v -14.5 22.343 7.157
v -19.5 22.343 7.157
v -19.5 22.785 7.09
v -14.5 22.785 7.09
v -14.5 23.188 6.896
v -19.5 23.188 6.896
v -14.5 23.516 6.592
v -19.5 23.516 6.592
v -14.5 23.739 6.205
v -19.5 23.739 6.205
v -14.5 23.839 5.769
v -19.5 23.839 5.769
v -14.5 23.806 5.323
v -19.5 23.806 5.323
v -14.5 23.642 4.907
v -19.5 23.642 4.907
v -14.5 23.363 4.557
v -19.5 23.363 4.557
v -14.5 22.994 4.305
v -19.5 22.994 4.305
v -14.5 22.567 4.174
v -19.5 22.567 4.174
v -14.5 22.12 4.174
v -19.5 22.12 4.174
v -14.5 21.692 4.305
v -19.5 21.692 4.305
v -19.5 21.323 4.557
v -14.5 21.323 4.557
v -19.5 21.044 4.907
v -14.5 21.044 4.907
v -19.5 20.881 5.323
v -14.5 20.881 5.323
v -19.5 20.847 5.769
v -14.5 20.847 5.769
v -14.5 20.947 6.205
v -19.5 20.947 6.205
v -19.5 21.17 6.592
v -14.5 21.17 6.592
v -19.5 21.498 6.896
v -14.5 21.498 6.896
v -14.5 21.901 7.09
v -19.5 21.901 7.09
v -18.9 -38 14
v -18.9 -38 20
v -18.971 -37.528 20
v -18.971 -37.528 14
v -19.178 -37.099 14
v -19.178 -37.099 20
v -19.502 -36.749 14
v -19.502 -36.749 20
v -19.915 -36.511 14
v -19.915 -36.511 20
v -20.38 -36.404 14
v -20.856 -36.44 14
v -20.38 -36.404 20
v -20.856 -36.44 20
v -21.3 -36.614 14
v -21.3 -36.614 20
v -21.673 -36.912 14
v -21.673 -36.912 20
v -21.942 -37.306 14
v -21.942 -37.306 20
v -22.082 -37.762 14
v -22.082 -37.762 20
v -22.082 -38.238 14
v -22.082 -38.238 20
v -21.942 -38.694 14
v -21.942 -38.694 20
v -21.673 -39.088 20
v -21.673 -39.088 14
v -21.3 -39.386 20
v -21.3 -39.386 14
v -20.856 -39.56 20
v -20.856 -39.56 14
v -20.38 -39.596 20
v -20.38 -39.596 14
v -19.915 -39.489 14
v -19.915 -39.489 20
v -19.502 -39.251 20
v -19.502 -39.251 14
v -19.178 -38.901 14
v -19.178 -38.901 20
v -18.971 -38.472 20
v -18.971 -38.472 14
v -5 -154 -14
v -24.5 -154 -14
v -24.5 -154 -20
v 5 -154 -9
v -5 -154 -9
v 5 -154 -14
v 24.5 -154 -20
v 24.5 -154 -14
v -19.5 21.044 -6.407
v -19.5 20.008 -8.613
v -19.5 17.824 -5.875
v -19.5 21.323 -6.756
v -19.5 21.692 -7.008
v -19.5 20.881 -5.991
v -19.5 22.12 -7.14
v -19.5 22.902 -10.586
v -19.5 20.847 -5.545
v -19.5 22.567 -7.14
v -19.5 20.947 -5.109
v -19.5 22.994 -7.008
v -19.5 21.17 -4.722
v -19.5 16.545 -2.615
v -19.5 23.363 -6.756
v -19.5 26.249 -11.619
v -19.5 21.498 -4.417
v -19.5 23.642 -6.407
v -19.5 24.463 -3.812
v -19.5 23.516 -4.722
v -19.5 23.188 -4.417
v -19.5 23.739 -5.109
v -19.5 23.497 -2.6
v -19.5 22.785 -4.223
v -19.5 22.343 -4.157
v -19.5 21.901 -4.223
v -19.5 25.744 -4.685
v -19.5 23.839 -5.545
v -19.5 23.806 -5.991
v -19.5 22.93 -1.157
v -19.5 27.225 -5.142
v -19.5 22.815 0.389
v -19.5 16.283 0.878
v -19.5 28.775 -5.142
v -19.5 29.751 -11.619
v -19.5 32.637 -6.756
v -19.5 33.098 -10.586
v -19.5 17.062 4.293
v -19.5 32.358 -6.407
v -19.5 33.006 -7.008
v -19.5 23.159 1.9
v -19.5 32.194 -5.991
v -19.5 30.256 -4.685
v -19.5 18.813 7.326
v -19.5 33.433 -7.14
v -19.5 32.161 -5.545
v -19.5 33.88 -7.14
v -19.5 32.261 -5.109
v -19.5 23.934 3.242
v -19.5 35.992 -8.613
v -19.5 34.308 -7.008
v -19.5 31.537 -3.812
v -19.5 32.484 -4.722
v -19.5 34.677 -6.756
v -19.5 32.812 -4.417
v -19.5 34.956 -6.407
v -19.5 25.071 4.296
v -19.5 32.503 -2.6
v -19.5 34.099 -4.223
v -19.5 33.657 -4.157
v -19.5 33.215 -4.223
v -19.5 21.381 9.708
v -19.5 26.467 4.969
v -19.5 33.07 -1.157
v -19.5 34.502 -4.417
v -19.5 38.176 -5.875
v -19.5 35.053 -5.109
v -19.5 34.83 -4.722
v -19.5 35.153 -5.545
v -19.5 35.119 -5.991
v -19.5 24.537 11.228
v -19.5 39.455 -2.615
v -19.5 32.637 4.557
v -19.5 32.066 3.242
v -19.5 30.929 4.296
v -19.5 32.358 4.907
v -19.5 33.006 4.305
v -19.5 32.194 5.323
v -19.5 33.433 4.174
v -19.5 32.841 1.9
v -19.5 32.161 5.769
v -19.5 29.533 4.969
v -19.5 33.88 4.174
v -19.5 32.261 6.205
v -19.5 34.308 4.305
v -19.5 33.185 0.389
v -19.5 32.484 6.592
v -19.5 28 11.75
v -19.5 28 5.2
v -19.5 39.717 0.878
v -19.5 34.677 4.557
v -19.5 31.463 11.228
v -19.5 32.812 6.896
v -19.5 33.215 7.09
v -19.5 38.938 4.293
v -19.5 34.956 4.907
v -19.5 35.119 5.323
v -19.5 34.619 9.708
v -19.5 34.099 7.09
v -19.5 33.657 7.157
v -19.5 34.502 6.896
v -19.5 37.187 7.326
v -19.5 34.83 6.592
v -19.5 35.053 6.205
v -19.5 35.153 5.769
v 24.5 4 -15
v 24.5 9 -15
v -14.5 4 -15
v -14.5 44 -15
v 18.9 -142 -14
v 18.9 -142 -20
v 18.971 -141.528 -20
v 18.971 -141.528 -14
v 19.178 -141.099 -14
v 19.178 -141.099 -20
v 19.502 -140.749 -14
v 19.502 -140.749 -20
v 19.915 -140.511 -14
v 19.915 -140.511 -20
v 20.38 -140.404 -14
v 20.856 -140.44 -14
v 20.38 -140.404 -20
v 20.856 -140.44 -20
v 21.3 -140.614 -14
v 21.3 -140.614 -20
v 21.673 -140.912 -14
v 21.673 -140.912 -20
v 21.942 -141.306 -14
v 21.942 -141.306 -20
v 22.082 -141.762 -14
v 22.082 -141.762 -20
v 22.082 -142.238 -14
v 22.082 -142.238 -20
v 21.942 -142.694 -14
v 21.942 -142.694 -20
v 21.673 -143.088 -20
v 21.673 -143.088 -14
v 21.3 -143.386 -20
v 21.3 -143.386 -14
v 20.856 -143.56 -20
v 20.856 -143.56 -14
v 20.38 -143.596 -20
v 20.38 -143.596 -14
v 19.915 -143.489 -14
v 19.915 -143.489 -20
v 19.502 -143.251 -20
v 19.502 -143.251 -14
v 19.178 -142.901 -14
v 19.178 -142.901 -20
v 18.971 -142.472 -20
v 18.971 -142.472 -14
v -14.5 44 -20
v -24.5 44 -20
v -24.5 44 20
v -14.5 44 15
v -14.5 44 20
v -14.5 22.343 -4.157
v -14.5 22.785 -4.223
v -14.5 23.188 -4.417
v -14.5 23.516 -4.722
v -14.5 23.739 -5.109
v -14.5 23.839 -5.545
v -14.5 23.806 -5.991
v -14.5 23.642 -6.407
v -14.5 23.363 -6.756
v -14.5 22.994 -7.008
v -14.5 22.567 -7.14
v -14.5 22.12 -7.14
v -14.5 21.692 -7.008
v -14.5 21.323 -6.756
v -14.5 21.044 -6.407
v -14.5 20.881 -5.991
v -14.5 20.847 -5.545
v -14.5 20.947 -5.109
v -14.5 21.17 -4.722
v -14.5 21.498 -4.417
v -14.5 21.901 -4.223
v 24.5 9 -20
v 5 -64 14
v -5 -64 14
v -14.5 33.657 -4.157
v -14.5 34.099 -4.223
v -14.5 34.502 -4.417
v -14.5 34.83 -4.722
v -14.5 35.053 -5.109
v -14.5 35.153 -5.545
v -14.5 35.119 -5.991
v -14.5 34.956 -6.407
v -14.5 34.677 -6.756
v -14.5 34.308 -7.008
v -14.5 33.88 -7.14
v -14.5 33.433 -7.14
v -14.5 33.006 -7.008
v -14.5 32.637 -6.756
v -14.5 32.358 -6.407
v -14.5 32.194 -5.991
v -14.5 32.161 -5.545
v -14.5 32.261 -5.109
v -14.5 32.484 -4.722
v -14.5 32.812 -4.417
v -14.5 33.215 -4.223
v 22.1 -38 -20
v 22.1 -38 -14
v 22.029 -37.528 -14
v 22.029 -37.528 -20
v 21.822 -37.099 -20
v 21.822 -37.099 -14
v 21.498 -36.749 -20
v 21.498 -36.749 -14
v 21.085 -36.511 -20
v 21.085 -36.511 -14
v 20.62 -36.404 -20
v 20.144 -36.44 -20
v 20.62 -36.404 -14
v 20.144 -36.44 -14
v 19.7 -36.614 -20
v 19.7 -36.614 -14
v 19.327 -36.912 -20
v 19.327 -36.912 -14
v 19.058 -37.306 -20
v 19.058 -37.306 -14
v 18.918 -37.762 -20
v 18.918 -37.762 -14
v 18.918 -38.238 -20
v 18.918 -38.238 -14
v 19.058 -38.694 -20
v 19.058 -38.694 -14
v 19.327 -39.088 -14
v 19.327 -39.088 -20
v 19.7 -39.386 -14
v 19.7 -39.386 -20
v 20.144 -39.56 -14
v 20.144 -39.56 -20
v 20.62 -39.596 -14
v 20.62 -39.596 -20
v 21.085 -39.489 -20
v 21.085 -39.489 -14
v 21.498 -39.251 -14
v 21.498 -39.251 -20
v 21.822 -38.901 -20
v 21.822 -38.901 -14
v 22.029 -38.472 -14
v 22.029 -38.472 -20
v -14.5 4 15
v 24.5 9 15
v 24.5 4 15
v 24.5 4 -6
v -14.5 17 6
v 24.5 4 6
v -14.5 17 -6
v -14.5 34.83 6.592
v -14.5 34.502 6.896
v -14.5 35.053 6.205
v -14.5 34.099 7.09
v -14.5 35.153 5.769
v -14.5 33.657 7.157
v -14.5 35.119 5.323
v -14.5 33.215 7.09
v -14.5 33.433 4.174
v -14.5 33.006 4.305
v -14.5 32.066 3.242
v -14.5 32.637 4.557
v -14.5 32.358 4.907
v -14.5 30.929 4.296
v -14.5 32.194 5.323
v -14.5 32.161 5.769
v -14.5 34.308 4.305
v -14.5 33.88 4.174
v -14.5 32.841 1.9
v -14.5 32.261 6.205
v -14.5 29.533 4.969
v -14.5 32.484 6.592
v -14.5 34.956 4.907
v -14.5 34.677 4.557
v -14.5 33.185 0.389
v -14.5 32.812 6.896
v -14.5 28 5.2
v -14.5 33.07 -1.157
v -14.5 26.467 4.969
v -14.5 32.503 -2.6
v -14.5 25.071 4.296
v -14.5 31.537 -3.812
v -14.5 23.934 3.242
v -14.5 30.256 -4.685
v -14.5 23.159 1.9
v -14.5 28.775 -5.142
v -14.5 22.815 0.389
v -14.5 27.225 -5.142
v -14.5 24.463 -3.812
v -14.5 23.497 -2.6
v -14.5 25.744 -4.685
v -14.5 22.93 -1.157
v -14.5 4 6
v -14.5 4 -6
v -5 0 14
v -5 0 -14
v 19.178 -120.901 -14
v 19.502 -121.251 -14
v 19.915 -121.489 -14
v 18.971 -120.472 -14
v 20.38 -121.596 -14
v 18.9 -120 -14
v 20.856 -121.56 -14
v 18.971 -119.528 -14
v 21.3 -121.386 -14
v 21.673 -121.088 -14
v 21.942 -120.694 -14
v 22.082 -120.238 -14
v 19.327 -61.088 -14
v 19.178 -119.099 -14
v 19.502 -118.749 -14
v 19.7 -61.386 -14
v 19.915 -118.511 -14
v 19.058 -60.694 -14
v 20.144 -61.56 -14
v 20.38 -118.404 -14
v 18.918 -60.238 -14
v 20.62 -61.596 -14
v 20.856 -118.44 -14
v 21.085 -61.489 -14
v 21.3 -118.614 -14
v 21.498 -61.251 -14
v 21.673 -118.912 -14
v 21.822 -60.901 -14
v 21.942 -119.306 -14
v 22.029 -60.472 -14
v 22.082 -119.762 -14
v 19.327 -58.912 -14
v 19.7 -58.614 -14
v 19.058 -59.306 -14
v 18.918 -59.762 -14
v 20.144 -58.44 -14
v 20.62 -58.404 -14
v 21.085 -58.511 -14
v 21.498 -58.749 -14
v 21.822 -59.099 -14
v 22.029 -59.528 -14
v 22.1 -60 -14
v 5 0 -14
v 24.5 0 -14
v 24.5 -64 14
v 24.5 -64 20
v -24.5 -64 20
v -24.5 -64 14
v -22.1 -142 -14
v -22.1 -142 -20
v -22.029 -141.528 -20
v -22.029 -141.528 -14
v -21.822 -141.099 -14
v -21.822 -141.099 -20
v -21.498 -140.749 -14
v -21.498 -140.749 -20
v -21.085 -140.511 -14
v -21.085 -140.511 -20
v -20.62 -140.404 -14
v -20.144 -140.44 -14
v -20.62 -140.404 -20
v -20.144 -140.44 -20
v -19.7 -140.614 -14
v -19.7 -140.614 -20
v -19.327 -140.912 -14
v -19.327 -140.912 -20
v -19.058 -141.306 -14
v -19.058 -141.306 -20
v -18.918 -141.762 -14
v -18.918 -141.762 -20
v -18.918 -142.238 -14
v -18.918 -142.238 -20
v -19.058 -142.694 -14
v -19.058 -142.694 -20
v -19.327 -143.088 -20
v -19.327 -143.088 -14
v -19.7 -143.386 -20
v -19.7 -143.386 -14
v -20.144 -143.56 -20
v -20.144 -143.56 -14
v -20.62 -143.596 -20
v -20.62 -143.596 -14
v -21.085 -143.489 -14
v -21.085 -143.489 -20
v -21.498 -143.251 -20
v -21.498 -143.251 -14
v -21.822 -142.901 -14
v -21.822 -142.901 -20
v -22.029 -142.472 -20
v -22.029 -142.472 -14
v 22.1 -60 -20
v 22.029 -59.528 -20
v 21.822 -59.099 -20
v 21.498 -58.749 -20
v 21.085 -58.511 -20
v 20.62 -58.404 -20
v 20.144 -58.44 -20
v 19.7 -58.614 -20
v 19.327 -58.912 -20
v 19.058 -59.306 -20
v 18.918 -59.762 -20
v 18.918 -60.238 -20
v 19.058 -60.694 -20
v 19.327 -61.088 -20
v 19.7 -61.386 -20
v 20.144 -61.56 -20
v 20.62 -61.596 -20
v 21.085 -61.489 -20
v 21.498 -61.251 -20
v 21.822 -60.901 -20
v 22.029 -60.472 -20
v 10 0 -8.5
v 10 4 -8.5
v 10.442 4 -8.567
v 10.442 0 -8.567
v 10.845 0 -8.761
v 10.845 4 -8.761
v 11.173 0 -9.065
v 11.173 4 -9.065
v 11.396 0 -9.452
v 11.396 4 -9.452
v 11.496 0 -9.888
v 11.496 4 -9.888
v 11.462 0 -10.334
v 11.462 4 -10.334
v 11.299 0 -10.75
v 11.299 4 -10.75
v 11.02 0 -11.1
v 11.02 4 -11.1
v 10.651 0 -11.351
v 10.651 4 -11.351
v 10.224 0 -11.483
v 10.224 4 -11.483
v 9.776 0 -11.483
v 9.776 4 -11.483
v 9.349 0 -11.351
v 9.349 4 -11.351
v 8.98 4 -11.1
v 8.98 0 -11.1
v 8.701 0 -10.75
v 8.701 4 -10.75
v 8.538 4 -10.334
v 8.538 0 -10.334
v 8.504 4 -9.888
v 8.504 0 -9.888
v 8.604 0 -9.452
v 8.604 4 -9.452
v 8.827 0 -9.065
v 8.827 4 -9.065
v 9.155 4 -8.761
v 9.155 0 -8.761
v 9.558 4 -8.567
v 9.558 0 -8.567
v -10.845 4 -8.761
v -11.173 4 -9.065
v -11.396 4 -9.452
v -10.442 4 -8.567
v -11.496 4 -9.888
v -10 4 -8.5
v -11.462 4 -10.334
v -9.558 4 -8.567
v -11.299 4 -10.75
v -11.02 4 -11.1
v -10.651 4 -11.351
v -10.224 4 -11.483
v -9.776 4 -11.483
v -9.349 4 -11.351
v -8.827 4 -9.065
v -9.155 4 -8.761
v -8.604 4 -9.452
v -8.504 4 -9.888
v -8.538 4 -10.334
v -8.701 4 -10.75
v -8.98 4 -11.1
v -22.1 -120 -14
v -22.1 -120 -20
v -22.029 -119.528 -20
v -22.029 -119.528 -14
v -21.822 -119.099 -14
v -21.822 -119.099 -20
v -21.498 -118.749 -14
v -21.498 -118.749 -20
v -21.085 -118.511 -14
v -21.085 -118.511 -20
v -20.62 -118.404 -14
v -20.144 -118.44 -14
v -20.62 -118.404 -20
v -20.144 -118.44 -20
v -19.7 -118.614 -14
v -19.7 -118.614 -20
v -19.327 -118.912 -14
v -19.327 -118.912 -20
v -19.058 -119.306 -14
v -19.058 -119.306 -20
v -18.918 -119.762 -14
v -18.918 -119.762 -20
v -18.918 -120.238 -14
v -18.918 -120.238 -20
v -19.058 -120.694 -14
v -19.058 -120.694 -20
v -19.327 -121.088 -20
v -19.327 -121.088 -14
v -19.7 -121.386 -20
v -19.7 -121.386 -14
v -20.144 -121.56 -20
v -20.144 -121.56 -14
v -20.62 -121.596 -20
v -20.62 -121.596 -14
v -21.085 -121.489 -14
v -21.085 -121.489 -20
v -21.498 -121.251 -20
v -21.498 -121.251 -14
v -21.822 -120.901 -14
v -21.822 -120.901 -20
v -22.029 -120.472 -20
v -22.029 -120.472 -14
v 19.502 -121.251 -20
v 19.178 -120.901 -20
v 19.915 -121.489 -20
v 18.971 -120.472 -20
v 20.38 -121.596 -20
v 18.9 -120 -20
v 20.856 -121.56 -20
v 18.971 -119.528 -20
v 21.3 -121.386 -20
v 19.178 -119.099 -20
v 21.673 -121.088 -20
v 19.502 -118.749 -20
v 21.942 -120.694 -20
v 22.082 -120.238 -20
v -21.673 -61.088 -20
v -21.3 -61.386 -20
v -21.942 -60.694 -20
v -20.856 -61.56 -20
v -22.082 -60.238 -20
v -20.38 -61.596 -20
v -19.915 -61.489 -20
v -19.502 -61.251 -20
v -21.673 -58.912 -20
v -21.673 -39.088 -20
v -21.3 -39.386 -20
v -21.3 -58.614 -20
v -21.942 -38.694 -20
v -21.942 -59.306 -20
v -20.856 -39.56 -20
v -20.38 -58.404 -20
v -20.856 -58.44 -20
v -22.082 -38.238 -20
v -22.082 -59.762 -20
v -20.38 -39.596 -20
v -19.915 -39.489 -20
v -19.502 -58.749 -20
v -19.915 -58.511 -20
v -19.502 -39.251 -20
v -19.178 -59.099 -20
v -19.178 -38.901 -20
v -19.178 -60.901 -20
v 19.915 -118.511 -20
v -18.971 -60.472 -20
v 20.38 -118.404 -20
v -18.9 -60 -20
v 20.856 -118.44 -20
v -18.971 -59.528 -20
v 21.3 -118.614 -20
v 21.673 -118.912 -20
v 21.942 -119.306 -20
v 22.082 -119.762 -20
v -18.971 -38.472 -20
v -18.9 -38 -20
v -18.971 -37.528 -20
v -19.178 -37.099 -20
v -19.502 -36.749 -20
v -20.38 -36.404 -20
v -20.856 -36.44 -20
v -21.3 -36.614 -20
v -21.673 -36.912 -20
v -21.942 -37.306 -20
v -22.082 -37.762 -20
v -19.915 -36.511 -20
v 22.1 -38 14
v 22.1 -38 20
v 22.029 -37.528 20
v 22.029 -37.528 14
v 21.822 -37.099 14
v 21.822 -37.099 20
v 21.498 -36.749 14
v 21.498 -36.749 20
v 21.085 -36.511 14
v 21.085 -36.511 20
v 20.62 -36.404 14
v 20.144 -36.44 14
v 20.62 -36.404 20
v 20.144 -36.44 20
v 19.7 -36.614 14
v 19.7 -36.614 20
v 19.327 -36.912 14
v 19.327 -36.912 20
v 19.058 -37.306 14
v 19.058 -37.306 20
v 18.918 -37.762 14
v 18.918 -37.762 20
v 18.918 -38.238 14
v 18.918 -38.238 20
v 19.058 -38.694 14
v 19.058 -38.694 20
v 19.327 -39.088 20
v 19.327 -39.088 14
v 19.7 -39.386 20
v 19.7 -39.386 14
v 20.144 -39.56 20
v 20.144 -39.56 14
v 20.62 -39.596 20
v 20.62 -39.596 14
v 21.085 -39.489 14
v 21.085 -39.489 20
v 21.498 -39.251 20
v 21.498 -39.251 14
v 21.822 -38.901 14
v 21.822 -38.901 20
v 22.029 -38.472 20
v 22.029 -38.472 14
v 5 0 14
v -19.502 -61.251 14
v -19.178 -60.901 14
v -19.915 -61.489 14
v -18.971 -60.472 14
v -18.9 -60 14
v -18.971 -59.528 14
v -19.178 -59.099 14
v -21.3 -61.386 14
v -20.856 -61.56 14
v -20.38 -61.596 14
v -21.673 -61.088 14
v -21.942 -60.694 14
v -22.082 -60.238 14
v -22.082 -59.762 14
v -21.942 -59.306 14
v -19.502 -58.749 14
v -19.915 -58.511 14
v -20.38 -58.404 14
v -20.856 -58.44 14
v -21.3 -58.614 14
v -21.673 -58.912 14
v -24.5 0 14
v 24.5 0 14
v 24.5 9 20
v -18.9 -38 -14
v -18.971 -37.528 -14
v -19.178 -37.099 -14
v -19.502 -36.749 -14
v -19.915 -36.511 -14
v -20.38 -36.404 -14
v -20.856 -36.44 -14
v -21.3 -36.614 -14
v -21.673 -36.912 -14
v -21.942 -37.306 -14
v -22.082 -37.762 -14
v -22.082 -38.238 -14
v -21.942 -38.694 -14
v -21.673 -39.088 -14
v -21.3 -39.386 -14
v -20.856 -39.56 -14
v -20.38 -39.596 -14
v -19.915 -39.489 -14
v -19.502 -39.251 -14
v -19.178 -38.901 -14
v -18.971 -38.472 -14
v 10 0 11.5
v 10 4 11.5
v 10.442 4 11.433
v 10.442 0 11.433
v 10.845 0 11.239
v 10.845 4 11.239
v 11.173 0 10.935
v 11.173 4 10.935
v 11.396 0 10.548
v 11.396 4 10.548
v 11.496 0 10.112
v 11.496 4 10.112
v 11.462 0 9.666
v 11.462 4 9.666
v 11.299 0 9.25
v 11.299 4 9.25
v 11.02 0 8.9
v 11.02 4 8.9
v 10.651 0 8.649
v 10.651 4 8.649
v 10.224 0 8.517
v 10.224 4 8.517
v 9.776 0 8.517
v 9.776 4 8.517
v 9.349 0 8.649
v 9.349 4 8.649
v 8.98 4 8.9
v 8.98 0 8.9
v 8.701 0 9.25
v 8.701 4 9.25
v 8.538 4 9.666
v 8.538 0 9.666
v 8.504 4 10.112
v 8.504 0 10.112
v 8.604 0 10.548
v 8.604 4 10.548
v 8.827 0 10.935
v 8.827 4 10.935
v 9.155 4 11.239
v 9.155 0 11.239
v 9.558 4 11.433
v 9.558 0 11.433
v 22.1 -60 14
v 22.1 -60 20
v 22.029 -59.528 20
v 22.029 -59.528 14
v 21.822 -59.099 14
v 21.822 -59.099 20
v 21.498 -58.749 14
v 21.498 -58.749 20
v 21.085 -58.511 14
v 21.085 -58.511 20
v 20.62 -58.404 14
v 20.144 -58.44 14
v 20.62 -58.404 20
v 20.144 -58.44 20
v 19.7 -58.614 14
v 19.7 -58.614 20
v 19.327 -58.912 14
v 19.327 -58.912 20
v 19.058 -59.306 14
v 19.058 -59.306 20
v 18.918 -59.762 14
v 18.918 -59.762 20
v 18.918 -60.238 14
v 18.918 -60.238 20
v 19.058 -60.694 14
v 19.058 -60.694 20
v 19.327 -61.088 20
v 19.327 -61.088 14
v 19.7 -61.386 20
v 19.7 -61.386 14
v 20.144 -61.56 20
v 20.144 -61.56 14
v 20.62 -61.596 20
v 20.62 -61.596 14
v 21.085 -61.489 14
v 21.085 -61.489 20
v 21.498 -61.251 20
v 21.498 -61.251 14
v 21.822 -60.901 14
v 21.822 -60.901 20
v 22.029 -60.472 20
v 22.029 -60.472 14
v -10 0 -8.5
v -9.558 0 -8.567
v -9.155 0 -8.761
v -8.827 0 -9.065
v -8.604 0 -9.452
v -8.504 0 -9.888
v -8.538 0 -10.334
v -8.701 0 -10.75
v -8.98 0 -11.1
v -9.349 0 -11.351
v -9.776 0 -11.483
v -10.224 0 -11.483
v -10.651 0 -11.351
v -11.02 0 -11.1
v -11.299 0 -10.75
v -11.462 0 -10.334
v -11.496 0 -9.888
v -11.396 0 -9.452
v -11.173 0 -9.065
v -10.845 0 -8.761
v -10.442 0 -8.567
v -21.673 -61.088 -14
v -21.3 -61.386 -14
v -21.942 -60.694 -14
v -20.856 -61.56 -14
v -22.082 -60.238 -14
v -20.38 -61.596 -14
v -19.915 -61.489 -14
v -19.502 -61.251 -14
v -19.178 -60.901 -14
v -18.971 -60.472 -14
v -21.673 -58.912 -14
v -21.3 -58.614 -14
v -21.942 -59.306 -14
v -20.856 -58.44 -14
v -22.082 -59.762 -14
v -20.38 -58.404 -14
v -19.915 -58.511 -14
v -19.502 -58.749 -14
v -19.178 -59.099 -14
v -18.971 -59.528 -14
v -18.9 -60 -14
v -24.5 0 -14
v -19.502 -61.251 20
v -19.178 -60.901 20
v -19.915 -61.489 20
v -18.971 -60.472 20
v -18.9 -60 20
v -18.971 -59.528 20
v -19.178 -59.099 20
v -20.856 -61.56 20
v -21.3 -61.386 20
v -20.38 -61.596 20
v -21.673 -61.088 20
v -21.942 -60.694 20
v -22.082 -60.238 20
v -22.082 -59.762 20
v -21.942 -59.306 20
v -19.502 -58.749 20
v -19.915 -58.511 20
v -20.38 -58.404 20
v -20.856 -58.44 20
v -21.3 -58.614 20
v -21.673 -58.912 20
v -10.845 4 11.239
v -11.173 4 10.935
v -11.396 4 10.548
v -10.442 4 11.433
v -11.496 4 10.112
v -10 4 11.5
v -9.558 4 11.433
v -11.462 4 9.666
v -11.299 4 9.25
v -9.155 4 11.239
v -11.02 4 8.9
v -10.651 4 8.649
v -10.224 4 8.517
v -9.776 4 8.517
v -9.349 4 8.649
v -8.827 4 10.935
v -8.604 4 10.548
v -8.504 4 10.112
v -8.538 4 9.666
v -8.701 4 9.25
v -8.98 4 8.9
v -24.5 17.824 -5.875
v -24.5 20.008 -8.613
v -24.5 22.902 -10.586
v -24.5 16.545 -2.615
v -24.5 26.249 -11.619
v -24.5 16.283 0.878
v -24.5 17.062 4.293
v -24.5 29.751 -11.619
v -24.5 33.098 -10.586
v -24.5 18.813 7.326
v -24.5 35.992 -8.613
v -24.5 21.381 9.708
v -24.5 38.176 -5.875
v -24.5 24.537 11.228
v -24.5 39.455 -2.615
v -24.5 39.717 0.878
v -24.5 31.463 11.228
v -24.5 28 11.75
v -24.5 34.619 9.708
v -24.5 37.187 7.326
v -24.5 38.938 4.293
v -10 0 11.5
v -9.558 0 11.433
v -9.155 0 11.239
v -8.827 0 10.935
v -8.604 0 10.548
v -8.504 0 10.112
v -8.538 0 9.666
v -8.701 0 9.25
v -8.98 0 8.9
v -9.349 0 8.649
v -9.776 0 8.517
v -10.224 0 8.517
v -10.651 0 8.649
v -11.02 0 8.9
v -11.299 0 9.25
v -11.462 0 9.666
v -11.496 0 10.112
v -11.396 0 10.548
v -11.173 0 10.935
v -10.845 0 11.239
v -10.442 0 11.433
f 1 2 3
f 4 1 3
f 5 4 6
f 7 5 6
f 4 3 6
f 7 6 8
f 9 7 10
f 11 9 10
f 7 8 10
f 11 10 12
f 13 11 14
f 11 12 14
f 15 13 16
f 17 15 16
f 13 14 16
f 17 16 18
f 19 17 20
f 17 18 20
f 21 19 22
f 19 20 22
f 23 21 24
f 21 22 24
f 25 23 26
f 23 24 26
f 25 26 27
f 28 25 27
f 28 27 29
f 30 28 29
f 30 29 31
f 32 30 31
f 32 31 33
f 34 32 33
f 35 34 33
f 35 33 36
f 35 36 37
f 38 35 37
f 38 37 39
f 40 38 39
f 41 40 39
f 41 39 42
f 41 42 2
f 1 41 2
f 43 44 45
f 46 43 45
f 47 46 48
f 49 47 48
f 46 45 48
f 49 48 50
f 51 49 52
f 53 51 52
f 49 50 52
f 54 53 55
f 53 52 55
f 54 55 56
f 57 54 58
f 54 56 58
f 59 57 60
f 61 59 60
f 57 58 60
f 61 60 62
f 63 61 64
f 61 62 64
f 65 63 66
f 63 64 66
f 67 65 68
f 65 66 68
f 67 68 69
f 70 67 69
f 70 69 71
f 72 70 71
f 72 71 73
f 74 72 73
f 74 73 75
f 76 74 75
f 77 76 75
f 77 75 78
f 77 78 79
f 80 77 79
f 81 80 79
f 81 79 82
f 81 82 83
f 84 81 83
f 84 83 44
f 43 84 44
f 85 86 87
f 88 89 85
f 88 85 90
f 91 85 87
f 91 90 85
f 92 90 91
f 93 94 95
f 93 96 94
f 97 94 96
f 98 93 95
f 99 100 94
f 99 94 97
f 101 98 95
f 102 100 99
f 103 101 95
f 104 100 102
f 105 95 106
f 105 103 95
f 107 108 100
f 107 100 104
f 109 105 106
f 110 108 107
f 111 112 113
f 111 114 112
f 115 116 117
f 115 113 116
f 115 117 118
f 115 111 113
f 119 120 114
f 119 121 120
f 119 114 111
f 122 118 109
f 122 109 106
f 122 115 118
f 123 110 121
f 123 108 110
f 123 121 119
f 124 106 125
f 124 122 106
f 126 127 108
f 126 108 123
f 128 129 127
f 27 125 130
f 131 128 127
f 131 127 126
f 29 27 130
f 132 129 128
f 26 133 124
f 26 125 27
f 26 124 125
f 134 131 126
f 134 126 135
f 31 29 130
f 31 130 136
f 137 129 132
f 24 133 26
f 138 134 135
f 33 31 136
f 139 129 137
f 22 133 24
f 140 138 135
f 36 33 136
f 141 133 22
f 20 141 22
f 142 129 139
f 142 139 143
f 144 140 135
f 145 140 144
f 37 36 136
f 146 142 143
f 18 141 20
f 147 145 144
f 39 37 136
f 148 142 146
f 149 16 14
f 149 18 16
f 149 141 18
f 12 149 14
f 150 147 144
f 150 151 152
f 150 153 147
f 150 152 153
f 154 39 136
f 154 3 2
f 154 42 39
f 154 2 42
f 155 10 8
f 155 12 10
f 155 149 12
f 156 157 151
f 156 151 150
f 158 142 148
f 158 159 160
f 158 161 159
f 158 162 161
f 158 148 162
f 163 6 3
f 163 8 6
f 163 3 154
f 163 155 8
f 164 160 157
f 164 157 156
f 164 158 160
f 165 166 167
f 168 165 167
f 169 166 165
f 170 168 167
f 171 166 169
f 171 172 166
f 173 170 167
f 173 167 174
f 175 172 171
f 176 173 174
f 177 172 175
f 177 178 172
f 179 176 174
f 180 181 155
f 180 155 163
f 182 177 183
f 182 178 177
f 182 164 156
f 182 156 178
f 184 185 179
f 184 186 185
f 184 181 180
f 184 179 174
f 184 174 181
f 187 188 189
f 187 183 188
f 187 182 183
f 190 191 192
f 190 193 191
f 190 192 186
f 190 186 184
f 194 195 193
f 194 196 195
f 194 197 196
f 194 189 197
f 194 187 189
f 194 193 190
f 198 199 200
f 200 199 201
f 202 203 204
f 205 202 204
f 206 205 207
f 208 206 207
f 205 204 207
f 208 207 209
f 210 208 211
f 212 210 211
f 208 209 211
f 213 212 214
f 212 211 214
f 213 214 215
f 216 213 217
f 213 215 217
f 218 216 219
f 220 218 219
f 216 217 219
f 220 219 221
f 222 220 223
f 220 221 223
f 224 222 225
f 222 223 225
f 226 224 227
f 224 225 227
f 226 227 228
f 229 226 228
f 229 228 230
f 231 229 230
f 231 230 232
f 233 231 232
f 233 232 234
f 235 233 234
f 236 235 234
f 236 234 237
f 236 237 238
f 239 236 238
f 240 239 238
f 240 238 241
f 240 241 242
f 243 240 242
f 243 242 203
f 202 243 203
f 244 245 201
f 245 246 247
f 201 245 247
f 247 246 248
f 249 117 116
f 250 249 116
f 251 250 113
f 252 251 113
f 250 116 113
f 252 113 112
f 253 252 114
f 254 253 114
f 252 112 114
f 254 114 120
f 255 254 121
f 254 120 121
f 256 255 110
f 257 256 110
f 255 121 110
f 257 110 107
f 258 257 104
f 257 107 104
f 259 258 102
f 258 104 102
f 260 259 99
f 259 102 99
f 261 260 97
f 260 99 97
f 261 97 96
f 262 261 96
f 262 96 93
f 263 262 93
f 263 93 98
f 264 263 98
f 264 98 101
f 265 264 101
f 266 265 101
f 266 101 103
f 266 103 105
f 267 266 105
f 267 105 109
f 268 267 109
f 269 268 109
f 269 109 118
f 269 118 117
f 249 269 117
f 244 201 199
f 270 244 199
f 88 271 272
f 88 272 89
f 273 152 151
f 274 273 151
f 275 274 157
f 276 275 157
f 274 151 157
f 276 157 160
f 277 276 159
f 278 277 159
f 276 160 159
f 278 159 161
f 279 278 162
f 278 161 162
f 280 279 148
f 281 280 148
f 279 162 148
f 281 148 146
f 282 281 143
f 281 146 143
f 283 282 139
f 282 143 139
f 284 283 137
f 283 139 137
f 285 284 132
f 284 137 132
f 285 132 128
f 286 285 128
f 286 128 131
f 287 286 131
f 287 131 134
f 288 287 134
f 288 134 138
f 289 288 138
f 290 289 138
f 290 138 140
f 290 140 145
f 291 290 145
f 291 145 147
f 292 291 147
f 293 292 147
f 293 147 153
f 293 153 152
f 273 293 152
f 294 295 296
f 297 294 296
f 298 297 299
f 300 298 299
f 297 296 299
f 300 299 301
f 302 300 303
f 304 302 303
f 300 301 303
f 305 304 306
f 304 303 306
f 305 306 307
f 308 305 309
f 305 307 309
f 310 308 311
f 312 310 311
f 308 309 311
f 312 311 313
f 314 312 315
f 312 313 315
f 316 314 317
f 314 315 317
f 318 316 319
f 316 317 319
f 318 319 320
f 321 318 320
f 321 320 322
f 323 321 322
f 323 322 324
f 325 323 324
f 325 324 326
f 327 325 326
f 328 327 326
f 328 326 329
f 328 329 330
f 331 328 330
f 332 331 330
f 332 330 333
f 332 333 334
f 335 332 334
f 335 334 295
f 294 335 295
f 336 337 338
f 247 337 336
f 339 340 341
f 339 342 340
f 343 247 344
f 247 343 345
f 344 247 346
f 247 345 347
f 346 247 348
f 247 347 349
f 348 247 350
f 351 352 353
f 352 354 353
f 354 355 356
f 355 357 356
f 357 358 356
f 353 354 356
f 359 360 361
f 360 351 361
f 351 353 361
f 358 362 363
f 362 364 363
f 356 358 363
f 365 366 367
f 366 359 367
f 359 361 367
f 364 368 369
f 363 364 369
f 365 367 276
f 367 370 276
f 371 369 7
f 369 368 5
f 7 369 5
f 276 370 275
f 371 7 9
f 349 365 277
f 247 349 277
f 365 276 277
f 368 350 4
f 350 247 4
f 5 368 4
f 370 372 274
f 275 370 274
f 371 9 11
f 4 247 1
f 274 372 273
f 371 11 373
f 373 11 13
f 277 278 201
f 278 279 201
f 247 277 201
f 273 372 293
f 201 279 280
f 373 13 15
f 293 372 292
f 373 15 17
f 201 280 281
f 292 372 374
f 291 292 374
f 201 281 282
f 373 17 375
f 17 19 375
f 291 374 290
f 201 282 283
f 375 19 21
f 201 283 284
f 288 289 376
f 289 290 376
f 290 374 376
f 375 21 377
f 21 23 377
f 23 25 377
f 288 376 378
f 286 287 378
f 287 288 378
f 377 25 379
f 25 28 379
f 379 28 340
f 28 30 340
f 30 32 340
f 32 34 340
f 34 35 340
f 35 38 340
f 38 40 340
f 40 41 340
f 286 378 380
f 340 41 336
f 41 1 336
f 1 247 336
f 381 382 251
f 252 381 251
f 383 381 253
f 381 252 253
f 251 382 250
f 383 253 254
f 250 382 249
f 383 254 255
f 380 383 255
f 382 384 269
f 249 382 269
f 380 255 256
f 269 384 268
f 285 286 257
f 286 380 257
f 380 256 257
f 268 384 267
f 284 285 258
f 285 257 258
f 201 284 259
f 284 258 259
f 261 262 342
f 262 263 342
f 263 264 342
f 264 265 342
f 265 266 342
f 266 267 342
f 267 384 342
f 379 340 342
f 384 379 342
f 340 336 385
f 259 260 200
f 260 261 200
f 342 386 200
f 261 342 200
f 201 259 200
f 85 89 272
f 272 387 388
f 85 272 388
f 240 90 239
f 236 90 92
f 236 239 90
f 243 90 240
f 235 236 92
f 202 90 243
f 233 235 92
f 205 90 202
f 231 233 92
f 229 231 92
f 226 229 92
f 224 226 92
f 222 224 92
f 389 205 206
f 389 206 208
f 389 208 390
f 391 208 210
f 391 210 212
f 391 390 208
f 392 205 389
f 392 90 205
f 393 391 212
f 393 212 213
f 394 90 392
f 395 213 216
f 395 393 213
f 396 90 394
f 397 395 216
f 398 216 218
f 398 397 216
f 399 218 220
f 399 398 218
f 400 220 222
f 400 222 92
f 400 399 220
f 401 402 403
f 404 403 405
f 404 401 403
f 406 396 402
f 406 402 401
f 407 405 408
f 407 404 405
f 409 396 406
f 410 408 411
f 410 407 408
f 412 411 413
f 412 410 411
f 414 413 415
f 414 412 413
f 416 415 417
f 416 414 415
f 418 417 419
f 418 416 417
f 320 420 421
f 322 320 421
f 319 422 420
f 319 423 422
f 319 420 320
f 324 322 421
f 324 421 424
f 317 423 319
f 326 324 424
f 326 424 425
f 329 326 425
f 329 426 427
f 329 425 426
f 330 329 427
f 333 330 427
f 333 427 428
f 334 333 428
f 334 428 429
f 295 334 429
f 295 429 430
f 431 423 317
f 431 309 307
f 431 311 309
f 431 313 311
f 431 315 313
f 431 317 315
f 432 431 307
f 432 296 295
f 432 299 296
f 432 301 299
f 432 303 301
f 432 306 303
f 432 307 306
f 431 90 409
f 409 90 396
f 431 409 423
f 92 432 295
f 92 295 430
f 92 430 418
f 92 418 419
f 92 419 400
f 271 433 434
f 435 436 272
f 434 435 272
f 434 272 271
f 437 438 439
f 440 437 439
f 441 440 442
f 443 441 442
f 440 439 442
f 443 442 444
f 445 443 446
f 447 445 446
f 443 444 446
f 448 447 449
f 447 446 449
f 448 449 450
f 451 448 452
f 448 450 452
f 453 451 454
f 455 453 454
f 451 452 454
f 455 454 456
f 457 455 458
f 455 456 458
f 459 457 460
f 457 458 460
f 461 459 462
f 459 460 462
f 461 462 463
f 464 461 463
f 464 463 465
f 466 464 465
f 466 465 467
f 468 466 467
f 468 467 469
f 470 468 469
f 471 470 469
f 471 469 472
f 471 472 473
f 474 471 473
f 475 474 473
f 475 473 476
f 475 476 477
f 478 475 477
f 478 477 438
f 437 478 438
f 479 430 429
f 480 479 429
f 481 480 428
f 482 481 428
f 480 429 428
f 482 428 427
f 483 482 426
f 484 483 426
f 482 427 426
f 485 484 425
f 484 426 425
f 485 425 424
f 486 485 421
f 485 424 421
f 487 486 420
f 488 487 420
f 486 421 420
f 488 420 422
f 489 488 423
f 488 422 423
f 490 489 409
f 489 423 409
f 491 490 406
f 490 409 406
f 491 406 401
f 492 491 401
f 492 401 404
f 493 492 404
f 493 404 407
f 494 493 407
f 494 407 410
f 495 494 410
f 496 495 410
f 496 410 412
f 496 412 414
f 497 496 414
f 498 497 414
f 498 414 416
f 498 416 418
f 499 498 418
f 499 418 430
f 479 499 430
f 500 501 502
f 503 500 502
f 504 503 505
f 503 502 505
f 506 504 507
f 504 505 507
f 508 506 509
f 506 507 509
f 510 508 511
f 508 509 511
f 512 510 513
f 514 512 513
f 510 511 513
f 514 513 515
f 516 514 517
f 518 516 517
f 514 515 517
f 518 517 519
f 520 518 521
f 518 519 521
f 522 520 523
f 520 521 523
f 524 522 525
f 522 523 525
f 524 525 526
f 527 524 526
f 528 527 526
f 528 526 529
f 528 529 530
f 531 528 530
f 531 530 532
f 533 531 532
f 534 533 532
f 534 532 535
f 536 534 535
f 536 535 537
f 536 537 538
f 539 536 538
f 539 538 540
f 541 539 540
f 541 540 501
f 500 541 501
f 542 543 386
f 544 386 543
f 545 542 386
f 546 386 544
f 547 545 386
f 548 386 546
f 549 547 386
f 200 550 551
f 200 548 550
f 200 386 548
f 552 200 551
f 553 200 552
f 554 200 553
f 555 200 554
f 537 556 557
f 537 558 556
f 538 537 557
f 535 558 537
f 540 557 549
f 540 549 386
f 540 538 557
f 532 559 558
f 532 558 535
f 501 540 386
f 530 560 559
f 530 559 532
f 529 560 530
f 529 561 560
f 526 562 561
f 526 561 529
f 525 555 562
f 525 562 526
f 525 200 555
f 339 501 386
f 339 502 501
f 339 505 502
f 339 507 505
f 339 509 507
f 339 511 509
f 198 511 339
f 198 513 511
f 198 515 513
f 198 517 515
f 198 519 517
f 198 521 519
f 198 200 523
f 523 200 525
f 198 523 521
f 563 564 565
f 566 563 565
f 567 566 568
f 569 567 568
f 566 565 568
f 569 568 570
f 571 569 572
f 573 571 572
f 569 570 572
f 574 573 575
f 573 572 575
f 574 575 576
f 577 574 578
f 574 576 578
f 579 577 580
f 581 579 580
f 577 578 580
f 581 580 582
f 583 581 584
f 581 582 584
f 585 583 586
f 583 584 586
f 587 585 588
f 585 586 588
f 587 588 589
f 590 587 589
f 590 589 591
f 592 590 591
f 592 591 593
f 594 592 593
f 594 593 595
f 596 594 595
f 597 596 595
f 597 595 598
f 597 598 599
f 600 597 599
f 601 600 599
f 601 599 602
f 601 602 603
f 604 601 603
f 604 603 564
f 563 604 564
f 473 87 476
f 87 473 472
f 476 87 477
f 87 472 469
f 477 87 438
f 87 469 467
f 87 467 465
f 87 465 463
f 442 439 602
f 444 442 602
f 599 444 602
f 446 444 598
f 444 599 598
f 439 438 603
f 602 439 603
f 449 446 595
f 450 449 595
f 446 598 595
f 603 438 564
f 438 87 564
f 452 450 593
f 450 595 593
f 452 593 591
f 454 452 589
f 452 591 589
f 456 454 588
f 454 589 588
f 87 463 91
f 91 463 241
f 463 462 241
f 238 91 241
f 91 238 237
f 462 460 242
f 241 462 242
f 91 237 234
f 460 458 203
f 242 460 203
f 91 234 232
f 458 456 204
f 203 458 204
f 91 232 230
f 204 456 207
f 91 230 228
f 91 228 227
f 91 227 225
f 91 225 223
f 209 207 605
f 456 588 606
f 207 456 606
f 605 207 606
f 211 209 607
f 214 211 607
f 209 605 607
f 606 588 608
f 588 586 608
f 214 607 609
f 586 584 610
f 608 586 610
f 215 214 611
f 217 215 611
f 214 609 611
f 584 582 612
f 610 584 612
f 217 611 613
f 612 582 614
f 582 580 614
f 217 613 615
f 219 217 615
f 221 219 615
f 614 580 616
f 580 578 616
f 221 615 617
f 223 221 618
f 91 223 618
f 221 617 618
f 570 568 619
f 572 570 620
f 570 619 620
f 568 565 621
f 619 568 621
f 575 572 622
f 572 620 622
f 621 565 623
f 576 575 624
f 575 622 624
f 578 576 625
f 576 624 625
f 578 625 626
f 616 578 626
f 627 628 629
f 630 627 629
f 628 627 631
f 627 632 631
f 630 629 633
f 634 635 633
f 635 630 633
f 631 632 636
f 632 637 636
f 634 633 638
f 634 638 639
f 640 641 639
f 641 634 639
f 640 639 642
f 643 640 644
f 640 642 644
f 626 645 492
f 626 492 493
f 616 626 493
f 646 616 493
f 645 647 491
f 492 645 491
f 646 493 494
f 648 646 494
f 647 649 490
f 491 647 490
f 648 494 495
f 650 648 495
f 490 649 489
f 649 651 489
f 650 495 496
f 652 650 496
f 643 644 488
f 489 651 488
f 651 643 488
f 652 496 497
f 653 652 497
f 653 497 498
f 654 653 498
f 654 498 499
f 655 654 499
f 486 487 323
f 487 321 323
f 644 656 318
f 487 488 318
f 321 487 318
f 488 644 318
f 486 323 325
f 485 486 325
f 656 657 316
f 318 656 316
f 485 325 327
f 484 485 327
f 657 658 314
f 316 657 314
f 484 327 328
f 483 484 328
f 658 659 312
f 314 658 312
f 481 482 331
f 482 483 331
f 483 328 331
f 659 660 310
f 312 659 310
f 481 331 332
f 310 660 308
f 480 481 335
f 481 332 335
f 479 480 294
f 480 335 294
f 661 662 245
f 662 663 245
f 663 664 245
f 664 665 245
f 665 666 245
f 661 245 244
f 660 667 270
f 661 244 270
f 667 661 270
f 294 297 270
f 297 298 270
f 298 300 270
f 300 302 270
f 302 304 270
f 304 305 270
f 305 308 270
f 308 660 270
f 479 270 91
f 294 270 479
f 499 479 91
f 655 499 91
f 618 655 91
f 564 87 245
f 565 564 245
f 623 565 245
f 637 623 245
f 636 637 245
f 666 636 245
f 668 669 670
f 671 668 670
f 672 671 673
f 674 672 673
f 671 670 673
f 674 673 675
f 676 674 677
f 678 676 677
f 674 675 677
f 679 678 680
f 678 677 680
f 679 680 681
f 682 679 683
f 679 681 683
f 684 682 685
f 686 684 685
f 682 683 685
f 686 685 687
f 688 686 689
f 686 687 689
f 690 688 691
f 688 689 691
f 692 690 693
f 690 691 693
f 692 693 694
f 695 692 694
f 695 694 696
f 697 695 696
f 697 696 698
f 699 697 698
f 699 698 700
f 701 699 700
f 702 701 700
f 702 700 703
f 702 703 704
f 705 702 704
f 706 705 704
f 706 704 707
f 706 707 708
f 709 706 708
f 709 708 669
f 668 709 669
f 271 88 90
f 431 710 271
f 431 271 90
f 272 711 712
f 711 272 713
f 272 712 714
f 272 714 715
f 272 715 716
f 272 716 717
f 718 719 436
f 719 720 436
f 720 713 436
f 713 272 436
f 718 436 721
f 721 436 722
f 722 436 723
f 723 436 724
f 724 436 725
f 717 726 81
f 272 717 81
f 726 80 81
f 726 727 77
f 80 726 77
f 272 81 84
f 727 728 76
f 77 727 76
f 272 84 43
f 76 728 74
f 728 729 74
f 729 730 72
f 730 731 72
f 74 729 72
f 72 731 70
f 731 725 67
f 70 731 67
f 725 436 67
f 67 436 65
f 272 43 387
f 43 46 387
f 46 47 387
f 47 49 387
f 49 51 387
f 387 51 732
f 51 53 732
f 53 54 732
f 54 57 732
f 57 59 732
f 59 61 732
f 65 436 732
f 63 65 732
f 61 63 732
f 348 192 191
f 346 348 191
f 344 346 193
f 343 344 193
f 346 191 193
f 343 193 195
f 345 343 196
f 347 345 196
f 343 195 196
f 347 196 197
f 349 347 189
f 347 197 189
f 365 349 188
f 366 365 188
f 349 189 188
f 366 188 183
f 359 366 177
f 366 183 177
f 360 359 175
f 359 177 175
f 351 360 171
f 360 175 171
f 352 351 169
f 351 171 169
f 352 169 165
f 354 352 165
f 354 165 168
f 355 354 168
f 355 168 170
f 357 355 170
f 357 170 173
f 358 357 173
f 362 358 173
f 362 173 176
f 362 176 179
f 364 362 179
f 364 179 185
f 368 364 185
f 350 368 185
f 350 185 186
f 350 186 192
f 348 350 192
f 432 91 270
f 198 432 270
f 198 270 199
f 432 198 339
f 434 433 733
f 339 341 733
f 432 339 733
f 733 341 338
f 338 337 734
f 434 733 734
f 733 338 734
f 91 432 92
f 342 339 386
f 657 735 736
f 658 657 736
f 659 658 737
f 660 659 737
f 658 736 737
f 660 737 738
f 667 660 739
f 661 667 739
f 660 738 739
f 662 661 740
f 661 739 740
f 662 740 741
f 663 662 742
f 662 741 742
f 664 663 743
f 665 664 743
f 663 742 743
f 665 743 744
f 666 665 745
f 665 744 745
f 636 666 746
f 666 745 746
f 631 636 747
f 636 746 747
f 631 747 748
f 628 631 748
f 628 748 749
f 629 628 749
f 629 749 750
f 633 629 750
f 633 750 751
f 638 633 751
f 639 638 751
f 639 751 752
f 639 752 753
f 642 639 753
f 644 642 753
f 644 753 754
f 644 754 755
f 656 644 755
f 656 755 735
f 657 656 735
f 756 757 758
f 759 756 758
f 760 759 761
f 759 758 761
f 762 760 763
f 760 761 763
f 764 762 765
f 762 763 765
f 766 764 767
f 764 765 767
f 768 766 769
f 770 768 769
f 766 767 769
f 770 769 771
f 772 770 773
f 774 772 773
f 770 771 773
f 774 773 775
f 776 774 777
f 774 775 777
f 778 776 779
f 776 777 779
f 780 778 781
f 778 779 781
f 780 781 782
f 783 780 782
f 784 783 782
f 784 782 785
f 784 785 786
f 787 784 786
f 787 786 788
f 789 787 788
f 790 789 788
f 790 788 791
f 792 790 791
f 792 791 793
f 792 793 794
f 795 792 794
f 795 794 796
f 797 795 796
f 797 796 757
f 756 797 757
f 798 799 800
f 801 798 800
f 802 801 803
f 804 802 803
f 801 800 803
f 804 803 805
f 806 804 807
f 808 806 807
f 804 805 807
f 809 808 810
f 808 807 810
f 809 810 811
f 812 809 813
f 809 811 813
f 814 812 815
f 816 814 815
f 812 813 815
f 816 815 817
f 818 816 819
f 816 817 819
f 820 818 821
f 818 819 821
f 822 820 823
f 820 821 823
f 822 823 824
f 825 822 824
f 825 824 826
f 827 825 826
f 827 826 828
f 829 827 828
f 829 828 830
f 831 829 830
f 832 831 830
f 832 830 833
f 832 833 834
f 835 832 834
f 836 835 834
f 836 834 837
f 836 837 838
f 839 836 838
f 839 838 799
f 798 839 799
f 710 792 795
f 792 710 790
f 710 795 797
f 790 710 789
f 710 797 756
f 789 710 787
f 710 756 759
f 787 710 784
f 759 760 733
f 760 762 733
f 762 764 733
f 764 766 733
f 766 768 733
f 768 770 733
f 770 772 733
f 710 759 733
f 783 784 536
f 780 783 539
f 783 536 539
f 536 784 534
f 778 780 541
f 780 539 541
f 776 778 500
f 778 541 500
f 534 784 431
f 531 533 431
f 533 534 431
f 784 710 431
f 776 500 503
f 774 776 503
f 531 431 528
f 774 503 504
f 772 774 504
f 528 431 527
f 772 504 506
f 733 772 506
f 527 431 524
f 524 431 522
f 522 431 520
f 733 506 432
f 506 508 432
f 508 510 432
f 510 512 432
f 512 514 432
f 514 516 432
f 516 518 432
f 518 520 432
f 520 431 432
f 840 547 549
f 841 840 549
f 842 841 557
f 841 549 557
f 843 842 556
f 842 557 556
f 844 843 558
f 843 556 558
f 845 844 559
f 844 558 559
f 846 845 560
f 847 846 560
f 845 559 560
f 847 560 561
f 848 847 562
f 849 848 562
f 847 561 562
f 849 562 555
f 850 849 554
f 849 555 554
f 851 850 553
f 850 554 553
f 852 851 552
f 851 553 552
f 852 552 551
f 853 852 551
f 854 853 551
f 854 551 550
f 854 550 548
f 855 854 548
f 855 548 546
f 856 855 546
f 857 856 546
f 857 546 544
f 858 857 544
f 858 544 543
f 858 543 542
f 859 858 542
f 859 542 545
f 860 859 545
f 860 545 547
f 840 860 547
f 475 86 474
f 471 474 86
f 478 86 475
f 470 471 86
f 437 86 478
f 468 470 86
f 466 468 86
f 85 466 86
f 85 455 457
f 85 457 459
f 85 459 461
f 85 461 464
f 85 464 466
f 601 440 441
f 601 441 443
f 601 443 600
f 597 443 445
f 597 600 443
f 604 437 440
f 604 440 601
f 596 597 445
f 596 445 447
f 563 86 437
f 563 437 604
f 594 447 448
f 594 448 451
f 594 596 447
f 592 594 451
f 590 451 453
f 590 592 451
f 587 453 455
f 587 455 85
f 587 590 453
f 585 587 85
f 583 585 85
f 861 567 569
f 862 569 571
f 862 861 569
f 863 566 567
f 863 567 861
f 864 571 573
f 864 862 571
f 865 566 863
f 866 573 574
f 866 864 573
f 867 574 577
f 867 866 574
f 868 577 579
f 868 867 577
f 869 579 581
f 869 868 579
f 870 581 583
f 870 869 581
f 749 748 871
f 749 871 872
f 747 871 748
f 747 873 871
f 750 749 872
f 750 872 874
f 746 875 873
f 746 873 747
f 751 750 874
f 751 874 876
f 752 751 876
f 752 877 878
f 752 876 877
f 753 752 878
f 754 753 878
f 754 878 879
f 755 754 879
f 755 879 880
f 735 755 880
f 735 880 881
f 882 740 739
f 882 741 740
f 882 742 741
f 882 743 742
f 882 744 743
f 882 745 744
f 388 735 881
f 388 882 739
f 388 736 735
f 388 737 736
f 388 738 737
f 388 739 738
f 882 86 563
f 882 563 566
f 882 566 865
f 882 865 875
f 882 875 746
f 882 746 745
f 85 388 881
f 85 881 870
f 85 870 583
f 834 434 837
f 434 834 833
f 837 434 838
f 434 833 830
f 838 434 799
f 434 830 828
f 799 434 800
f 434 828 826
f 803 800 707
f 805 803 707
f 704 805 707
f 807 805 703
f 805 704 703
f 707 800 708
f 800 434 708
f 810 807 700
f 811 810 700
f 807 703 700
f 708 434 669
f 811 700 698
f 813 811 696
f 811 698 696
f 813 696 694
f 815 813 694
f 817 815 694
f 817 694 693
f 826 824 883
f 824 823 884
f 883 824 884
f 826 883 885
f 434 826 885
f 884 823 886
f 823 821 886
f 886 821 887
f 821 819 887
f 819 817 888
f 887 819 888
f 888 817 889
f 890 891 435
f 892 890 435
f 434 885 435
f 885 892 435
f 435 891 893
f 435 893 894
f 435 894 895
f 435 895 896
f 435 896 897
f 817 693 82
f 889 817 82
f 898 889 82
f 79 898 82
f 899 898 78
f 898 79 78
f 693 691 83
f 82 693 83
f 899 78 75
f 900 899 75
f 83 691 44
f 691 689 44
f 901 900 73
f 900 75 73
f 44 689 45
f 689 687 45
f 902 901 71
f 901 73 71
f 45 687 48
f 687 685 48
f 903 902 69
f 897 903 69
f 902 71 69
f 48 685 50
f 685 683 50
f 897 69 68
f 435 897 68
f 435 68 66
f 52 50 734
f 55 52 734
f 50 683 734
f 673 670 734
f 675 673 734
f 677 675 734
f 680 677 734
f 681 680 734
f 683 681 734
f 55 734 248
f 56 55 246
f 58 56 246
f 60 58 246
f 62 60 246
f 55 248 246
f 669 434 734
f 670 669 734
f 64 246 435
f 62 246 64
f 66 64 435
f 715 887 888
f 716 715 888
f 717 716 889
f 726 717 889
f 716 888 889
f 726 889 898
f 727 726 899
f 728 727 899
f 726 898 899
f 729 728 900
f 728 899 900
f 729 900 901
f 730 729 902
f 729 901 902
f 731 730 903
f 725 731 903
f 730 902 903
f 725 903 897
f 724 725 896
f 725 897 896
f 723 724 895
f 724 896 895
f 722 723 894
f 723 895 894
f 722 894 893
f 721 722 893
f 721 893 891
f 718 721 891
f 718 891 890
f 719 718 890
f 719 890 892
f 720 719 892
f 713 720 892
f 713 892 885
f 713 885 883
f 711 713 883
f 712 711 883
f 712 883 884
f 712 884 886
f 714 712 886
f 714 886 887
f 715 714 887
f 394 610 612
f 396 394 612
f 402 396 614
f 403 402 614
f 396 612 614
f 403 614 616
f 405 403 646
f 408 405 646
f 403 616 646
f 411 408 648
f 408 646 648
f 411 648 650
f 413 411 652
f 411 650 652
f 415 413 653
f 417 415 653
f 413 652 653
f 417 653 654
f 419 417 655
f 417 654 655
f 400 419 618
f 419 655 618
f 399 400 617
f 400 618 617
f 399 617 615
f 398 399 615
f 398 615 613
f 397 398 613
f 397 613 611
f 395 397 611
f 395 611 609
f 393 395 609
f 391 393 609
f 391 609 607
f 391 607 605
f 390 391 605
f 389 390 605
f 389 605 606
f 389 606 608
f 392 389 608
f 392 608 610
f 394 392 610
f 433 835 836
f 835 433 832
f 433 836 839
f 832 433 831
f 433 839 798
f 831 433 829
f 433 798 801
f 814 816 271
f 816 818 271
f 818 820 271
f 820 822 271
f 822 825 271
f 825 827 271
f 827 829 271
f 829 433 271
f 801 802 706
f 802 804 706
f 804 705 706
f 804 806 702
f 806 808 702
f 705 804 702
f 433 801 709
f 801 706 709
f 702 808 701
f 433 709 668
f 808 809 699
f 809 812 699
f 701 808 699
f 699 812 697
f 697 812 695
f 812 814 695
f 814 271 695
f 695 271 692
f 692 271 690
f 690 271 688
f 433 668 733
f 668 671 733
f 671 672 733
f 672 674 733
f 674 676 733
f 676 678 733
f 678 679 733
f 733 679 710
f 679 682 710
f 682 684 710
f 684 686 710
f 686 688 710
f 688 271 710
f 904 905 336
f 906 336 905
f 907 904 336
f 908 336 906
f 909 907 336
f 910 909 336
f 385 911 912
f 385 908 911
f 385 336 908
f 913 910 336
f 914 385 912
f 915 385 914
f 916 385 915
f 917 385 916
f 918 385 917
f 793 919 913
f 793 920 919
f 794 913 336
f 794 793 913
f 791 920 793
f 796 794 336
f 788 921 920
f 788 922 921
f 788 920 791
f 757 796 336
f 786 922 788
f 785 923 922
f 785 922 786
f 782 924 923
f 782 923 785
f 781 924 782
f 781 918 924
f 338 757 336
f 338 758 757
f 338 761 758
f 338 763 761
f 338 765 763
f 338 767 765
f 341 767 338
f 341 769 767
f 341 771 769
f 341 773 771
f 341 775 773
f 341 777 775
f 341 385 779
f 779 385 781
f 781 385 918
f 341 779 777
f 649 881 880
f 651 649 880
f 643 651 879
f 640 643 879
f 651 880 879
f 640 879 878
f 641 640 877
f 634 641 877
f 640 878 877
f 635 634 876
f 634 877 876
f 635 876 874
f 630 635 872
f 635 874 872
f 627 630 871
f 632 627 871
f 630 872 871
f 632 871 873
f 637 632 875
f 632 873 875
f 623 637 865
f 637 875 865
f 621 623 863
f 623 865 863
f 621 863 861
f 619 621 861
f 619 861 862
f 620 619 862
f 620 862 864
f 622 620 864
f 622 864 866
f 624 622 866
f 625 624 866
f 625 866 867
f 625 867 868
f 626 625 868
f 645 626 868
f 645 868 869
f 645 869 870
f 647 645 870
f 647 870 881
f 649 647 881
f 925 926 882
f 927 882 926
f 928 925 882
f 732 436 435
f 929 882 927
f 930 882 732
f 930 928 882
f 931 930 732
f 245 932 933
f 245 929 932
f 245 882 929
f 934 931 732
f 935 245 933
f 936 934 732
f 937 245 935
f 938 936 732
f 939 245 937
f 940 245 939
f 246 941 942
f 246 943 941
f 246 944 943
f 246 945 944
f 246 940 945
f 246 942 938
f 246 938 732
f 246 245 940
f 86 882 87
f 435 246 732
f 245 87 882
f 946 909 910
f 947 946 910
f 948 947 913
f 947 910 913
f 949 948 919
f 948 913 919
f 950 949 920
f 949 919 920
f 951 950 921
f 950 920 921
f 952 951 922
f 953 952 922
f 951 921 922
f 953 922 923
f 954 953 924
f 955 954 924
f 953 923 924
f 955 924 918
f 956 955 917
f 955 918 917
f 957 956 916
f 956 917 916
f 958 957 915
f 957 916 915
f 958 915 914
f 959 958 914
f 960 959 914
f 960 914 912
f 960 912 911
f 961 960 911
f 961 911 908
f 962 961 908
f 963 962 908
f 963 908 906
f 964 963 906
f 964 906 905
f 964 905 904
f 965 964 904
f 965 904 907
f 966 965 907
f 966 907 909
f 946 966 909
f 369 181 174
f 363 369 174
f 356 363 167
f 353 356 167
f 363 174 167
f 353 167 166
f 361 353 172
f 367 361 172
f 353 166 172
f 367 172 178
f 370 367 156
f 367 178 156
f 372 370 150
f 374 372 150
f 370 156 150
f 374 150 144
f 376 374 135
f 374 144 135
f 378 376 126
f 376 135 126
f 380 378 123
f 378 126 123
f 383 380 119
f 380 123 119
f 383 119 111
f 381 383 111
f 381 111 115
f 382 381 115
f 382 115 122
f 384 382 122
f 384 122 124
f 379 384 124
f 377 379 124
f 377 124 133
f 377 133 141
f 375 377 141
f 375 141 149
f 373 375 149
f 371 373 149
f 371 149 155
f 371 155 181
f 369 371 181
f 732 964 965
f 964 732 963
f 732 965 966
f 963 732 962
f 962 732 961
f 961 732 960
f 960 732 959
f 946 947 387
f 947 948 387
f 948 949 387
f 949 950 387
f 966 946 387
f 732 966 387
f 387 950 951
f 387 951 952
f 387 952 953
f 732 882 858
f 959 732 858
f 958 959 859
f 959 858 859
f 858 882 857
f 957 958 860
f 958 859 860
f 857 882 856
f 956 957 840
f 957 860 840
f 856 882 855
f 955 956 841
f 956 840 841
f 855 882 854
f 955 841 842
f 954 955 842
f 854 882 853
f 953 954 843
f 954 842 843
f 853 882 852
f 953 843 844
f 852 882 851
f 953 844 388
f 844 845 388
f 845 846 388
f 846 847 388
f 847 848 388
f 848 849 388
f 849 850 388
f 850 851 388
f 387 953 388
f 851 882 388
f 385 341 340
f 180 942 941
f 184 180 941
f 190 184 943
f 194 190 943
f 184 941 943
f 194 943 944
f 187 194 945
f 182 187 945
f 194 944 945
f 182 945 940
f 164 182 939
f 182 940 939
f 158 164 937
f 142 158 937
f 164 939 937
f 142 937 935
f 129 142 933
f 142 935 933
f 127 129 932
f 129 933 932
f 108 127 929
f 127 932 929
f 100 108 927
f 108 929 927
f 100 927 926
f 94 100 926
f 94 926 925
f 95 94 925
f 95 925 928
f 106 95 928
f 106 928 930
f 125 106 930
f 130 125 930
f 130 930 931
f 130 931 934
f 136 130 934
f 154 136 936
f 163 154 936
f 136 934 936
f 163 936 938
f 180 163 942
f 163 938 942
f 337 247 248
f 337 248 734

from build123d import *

# Parameters (mm, degrees)
SKETCH_1_W          = 49
SKETCH_1_H          = 40
EXTRUDE_1_DEPTH     = 4
SKETCH_2_R          = 1.5
CUT_EXTRUDE_1_DEPTH = 32.878676259
SKETCH_3_W          = 10
SKETCH_3_H          = 30
EXTRUDE_3_DEPTH     = 40
SKETCH_4_R          = 5.2
CUT_EXTRUDE_2_DEPTH = 69.82586723
SKETCH_5_R          = 11.75
CUT_EXTRUDE_3_DEPTH = 5
SKETCH_6_R          = 1.5
CUT_EXTRUDE_4_DEPTH = 66.360538553
EXTRUDE_4_DEPTH     = 6
SKETCH_8_W          = 6
SKETCH_8_H          = 64
EXTRUDE_5_DEPTH     = 49
SKETCH_9_R          = 1.6
CUT_EXTRUDE_5_DEPTH = 80.348913036
EXTRUDE_6_DEPTH     = 5
SKETCH_12_W         = 49
SKETCH_12_H         = 6
EXTRUDE_7_DEPTH     = 90
SKETCH_13_R         = 1.6
CUT_EXTRUDE_6_DEPTH = 161.985247771
EXTRUDE_8_DEPTH     = 5


with BuildPart() as part:
    # 草图1 → 凸台-拉伸1 (new body)
    with BuildSketch(Plane(origin=(0, 0, 0), x_dir=(1, 0, 0), z_dir=(0, 1, 0))):
        Rectangle(SKETCH_1_W, SKETCH_1_H)
    extrude(amount=EXTRUDE_1_DEPTH)

    # 草图2 → 切除-拉伸1 (cut, through all)
    with BuildSketch(Plane(origin=(0, 4, 0), x_dir=(1, 0, 0), z_dir=(0, 1, 0))):
        with Locations(Location((-10, 10, 0), (0, 0, 270))):
            Circle(SKETCH_2_R)
        with Locations(Location((10, 10, 0), (0, 0, 270))):
            Circle(SKETCH_2_R)
        with Locations(Location((10, -10, 0), (0, 0, 270))):
            Circle(SKETCH_2_R)
        with Locations(Location((-10, -10, 0), (0, 0, 270))):
            Circle(SKETCH_2_R)
    extrude(amount=-CUT_EXTRUDE_1_DEPTH, mode=Mode.SUBTRACT)

    # 草图3 → 凸台-拉伸3 (add)
    with BuildSketch(Plane(origin=(0, 4, 0), x_dir=(1, 0, 0), z_dir=(0, 1, 0))):
        with Locations((-19.5, 0)):
            Rectangle(SKETCH_3_W, SKETCH_3_H)
    extrude(amount=EXTRUDE_3_DEPTH)

    # 草图4 → 切除-拉伸2 (cut, through all)
    with BuildSketch(Plane.ZY.offset(24.5)):
        with Locations((0, 28)):
            Circle(SKETCH_4_R)
    extrude(amount=-CUT_EXTRUDE_2_DEPTH, mode=Mode.SUBTRACT)

    # 草图5 → 切除-拉伸3 (cut)
    with BuildSketch(Plane.ZY.offset(24.5)):
        with Locations((0, 28)):
            Circle(SKETCH_5_R)
    extrude(amount=-CUT_EXTRUDE_3_DEPTH, mode=Mode.SUBTRACT)

    # 草图6 → 切除-拉伸4 (cut, through all)
    with BuildSketch(Plane.ZY.offset(19.5)):
        with Locations((-5.656854249, 33.656854249)):
            Circle(SKETCH_6_R)
        with Locations((5.656854249, 33.656854249)):
            Circle(SKETCH_6_R)
        with Locations((5.656854249, 22.343145751)):
            Circle(SKETCH_6_R)
        with Locations((-5.656854249, 22.343145751)):
            Circle(SKETCH_6_R)
    extrude(amount=-CUT_EXTRUDE_4_DEPTH, mode=Mode.SUBTRACT)

    # 草图7 → 凸台-拉伸4 (add, symmetric)
    with BuildSketch(Plane(origin=(0, 0, 0), x_dir=(-1, 0, 0), z_dir=(0, 0, -1))):
        Polygon((14.5, 17), (-24.5, 4), (14.5, 4), align=None)
    extrude(amount=EXTRUDE_4_DEPTH, both=True)

    # 草图8 → 凸台-拉伸5 (add)
    with BuildSketch(Plane.ZY.offset(24.5)):
        with Locations((17, -32)):
            Rectangle(SKETCH_8_W, SKETCH_8_H)
        with Locations((-17, -32)):
            Rectangle(SKETCH_8_W, SKETCH_8_H)
    extrude(amount=-EXTRUDE_5_DEPTH)

    # 草图9 → 切除-拉伸5 (cut, through all)
    with BuildSketch(Plane.XY.offset(20)):
        with Locations((20.5, -60)):
            Circle(SKETCH_9_R)
        with Locations((-20.5, -60)):
            Circle(SKETCH_9_R)
        with Locations((20.5, -38)):
            Circle(SKETCH_9_R)
        with Locations((-20.5, -38)):
            Circle(SKETCH_9_R)
    extrude(amount=-CUT_EXTRUDE_5_DEPTH, mode=Mode.SUBTRACT)

    # 草图11 → 凸台-拉伸6 (add)
    with BuildSketch(Plane.XY.offset(15)):
        Polygon((-14.5, 44), (24.5, 9), (24.5, 4), (-14.5, 4), (-24.5, 4), (-24.5, 44), align=None)
    extrude_6 = extrude(amount=EXTRUDE_6_DEPTH)

    # 镜向2: 凸台-拉伸6 across plane
    add(extrude_6.mirror(Plane(origin=(0, 0, 0), x_dir=(1, 0, 0), z_dir=(0, 0, -1))))

    # 草图12 → 凸台-拉伸7 (add)
    with BuildSketch(Plane.XZ.offset(64)):
        with Locations((0, -17)):
            Rectangle(SKETCH_12_W, SKETCH_12_H)
    extrude(amount=EXTRUDE_7_DEPTH)

    # 草图13 → 切除-拉伸6 (cut, through all)
    with BuildSketch(Plane(origin=(0, 0, -20), x_dir=(-1, 0, 0), z_dir=(0, 0, -1))):
        with Locations((-20.5, -120)):
            Circle(SKETCH_13_R)
        with Locations((-20.5, -142)):
            Circle(SKETCH_13_R)
        with Locations((20.5, -120)):
            Circle(SKETCH_13_R)
        with Locations((20.5, -142)):
            Circle(SKETCH_13_R)
    extrude(amount=-CUT_EXTRUDE_6_DEPTH, mode=Mode.SUBTRACT)

    # 草图14 → 凸台-拉伸8 (add, symmetric)
    with BuildSketch(Plane(origin=(0, 0, 0), x_dir=(0, 0, -1), z_dir=(1, 0, 0))):
        Polygon((14, 0), (-14, 0), (-14, -64), (9, -154), (14, -154), (14, -64), align=None)
    extrude(amount=EXTRUDE_8_DEPTH, both=True)


solid = part.part
